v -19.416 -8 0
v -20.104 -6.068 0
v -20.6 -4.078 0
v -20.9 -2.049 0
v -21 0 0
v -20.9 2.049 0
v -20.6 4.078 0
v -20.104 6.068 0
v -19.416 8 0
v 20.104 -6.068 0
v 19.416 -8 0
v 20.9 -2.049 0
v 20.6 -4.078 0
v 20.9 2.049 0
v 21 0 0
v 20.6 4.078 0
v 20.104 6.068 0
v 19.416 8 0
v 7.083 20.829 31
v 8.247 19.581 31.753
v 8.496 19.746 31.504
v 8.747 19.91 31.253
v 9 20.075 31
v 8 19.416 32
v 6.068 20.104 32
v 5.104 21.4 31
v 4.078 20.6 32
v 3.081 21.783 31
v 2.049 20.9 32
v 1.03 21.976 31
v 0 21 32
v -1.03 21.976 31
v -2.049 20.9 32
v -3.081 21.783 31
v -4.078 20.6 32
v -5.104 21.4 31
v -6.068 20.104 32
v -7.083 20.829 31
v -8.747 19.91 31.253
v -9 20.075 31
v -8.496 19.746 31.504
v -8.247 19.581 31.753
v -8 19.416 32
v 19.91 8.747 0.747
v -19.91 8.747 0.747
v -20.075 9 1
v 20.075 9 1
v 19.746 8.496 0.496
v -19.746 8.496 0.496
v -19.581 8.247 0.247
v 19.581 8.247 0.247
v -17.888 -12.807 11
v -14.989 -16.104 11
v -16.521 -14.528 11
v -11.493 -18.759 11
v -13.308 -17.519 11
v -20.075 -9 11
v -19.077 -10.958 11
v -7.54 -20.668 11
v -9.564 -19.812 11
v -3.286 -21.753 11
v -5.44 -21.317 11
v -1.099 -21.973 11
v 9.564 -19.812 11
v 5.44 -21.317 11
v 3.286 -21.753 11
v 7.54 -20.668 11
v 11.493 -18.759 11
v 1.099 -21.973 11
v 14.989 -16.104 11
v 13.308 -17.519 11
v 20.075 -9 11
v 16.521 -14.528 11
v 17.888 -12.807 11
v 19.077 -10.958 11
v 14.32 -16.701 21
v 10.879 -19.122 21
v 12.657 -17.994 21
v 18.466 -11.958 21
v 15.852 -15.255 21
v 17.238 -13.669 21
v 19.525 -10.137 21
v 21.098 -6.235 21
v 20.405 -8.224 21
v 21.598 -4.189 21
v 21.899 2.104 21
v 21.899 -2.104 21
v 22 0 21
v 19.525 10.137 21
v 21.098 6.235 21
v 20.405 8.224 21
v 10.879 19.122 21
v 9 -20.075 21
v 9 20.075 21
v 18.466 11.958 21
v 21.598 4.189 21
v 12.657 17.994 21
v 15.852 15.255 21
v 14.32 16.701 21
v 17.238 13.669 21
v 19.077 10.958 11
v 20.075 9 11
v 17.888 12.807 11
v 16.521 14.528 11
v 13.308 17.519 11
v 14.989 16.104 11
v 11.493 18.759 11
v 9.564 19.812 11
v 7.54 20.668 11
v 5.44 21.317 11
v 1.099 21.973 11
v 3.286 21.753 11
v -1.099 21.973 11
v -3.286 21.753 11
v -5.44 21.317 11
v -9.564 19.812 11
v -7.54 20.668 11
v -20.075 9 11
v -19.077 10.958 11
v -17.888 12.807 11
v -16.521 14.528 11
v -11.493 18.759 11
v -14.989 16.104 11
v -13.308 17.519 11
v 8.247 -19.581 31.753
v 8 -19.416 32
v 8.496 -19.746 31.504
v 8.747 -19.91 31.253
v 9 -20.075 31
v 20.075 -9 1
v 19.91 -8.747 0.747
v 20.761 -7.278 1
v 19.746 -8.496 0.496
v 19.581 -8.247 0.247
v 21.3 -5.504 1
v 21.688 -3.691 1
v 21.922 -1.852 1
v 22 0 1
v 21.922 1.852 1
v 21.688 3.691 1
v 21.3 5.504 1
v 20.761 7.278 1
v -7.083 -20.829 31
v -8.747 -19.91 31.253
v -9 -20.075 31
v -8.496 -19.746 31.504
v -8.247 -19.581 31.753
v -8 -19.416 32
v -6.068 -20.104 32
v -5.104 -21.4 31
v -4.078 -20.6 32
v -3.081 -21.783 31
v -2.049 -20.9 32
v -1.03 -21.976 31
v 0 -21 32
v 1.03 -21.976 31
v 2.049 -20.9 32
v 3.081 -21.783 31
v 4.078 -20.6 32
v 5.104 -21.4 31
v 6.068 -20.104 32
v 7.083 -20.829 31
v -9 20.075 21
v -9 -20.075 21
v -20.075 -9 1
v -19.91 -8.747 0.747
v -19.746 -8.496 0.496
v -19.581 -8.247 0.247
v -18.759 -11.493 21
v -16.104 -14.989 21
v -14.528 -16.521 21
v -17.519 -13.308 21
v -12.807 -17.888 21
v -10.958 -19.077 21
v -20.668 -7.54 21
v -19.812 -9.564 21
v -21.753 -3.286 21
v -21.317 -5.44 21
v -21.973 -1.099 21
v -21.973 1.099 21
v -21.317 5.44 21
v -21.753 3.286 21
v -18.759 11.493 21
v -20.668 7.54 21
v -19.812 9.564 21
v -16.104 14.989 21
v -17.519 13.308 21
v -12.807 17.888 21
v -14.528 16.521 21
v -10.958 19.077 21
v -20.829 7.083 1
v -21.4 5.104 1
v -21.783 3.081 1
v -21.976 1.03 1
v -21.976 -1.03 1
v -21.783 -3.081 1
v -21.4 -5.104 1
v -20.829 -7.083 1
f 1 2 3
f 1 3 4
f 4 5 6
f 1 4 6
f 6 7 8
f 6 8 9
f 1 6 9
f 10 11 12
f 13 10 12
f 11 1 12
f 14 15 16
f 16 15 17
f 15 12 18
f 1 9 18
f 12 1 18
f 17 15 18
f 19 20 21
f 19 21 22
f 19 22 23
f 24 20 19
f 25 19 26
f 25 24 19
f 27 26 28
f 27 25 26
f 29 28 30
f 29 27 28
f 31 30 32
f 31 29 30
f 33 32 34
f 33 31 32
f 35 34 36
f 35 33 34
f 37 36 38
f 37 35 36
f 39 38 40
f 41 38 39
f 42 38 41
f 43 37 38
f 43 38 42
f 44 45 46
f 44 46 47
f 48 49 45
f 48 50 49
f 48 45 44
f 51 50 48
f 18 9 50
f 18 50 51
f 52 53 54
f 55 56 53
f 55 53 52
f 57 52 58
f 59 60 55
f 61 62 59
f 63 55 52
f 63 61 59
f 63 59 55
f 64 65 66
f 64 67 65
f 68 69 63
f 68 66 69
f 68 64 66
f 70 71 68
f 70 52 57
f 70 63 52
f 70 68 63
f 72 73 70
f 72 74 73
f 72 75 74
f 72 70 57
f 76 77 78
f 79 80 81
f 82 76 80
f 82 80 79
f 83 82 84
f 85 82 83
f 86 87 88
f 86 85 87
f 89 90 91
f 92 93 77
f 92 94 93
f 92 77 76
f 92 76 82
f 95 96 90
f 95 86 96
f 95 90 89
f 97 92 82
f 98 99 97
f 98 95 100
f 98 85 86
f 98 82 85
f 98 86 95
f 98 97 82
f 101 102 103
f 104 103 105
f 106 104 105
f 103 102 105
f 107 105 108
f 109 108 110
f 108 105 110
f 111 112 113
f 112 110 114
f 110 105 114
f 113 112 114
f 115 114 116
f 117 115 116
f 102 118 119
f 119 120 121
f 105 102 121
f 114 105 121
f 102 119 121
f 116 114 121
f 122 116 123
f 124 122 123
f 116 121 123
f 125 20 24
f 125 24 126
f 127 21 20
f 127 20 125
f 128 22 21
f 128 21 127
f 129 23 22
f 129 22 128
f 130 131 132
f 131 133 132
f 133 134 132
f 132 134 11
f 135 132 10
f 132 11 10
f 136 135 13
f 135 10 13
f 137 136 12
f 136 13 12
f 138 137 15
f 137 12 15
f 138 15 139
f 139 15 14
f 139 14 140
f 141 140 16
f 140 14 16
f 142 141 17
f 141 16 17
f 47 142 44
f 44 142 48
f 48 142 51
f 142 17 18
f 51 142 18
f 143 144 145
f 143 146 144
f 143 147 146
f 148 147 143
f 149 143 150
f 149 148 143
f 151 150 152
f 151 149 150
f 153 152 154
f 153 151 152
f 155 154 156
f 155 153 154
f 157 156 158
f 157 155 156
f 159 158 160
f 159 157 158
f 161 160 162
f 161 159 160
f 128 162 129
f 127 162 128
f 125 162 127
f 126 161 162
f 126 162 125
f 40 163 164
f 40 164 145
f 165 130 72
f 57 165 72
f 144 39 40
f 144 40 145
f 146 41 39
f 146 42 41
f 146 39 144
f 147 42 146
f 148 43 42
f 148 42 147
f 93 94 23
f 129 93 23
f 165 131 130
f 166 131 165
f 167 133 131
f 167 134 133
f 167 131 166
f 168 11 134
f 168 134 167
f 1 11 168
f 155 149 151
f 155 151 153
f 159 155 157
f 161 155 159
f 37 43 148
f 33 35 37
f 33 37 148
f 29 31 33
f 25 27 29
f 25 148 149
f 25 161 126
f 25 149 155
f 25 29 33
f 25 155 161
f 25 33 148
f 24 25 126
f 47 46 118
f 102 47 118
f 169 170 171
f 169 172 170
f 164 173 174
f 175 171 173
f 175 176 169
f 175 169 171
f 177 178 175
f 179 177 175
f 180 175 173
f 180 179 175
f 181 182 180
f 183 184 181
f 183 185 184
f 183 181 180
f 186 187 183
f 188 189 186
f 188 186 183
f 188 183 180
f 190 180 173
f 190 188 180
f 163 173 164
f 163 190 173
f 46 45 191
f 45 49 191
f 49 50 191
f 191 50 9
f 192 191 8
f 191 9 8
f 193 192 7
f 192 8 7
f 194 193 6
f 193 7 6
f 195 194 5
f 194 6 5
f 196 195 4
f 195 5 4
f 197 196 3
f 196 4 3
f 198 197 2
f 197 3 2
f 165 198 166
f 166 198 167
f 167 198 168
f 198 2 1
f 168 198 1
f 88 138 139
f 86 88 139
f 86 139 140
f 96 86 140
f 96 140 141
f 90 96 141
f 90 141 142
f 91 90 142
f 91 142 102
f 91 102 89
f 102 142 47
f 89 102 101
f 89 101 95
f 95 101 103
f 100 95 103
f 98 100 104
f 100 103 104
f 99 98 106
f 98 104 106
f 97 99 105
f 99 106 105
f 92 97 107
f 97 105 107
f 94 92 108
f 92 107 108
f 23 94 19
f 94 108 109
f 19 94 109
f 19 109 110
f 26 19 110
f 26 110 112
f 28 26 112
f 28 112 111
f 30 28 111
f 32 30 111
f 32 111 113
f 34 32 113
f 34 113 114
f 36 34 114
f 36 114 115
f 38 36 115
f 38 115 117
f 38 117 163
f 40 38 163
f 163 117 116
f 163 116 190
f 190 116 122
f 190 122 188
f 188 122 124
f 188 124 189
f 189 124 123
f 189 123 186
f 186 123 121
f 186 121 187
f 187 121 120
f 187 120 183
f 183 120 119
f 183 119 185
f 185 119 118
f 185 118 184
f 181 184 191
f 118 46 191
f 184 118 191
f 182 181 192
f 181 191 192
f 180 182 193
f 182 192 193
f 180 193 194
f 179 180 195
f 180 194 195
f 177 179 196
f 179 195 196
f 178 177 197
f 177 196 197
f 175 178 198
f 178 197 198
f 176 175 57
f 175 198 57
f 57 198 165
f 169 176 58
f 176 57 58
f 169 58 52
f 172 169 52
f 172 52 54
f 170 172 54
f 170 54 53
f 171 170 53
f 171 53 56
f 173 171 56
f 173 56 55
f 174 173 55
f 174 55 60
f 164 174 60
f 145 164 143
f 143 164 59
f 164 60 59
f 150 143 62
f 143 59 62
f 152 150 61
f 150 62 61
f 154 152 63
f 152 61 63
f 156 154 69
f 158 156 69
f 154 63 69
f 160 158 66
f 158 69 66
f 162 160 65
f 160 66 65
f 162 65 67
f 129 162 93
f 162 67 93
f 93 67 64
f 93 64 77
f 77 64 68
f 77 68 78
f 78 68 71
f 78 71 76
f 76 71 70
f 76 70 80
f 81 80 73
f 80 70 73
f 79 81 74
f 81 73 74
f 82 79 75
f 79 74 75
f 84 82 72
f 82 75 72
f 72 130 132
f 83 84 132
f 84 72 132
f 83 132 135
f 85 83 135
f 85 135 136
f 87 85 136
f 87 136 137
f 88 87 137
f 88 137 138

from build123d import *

# Parameters (mm, degrees)
F0_R          = 22
F1_DEPTH      = 32
F2_W          = 14.3667660505
F2_H          = 12.7565913796
F2_W_2        = 13.8227823973
F2_H_2        = 11.8480638564
F3_DEPTH      = 22.001
F3_DEPTH_BACK = 25
F4_W          = 16.210654363
F4_H          = 15.0942654014
F4_W_2        = 16.4447609186
F4_H_2        = 12.1968873441
F5_DEPTH      = 22.001
F5_DEPTH_BACK = 25
F6_SIZE       = 1


with BuildPart() as f1:
    # F0 (on Top) → F1 (new body)
    with BuildSketch(Plane.XY):
        Circle(F0_R)
    extrude(amount=F1_DEPTH)

    # F2 (on Front) → F3 (cut, two sides)
    with BuildSketch(Plane.XZ) as f3_sk:
        with Locations((-16.1833830252, 27.3782956898)):
            Rectangle(F2_W, F2_H)
        with Locations((15.9113911986, 26.9240319282)):
            Rectangle(F2_W_2, F2_H_2)
    extrude(amount=F3_DEPTH, mode=Mode.SUBTRACT)
    extrude(f3_sk.sketch, amount=-F3_DEPTH_BACK, mode=Mode.SUBTRACT)

    # F4 (on Right) → F5 (cut, two sides)
    with BuildSketch(Plane.YZ) as f5_sk:
        with Locations((-17.1053271815, 3.4528672993)):
            Rectangle(F4_W, F4_H)
        with Locations((17.2223804593, 4.9015563279)):
            Rectangle(F4_W_2, F4_H_2)
    extrude(amount=-F5_DEPTH, mode=Mode.SUBTRACT)
    extrude(f5_sk.sketch, amount=F5_DEPTH_BACK, mode=Mode.SUBTRACT)

    # F6
    f6_edges = [f1.edges().sort_by_distance(p)[0] for p in [
        (9, 0, 32),
        (0, -22, 32),
        (-9, 0, 32),
        (0, 22, 32),
        (21.513332, -4.601798, 0),
        (0, -9, 0),
        (-22, 0, 0),
        (0, 9, 0),
        (21.513332, 4.601798, 0),
    ]]
    chamfer(f6_edges, length=F6_SIZE)


solid = f1.part
